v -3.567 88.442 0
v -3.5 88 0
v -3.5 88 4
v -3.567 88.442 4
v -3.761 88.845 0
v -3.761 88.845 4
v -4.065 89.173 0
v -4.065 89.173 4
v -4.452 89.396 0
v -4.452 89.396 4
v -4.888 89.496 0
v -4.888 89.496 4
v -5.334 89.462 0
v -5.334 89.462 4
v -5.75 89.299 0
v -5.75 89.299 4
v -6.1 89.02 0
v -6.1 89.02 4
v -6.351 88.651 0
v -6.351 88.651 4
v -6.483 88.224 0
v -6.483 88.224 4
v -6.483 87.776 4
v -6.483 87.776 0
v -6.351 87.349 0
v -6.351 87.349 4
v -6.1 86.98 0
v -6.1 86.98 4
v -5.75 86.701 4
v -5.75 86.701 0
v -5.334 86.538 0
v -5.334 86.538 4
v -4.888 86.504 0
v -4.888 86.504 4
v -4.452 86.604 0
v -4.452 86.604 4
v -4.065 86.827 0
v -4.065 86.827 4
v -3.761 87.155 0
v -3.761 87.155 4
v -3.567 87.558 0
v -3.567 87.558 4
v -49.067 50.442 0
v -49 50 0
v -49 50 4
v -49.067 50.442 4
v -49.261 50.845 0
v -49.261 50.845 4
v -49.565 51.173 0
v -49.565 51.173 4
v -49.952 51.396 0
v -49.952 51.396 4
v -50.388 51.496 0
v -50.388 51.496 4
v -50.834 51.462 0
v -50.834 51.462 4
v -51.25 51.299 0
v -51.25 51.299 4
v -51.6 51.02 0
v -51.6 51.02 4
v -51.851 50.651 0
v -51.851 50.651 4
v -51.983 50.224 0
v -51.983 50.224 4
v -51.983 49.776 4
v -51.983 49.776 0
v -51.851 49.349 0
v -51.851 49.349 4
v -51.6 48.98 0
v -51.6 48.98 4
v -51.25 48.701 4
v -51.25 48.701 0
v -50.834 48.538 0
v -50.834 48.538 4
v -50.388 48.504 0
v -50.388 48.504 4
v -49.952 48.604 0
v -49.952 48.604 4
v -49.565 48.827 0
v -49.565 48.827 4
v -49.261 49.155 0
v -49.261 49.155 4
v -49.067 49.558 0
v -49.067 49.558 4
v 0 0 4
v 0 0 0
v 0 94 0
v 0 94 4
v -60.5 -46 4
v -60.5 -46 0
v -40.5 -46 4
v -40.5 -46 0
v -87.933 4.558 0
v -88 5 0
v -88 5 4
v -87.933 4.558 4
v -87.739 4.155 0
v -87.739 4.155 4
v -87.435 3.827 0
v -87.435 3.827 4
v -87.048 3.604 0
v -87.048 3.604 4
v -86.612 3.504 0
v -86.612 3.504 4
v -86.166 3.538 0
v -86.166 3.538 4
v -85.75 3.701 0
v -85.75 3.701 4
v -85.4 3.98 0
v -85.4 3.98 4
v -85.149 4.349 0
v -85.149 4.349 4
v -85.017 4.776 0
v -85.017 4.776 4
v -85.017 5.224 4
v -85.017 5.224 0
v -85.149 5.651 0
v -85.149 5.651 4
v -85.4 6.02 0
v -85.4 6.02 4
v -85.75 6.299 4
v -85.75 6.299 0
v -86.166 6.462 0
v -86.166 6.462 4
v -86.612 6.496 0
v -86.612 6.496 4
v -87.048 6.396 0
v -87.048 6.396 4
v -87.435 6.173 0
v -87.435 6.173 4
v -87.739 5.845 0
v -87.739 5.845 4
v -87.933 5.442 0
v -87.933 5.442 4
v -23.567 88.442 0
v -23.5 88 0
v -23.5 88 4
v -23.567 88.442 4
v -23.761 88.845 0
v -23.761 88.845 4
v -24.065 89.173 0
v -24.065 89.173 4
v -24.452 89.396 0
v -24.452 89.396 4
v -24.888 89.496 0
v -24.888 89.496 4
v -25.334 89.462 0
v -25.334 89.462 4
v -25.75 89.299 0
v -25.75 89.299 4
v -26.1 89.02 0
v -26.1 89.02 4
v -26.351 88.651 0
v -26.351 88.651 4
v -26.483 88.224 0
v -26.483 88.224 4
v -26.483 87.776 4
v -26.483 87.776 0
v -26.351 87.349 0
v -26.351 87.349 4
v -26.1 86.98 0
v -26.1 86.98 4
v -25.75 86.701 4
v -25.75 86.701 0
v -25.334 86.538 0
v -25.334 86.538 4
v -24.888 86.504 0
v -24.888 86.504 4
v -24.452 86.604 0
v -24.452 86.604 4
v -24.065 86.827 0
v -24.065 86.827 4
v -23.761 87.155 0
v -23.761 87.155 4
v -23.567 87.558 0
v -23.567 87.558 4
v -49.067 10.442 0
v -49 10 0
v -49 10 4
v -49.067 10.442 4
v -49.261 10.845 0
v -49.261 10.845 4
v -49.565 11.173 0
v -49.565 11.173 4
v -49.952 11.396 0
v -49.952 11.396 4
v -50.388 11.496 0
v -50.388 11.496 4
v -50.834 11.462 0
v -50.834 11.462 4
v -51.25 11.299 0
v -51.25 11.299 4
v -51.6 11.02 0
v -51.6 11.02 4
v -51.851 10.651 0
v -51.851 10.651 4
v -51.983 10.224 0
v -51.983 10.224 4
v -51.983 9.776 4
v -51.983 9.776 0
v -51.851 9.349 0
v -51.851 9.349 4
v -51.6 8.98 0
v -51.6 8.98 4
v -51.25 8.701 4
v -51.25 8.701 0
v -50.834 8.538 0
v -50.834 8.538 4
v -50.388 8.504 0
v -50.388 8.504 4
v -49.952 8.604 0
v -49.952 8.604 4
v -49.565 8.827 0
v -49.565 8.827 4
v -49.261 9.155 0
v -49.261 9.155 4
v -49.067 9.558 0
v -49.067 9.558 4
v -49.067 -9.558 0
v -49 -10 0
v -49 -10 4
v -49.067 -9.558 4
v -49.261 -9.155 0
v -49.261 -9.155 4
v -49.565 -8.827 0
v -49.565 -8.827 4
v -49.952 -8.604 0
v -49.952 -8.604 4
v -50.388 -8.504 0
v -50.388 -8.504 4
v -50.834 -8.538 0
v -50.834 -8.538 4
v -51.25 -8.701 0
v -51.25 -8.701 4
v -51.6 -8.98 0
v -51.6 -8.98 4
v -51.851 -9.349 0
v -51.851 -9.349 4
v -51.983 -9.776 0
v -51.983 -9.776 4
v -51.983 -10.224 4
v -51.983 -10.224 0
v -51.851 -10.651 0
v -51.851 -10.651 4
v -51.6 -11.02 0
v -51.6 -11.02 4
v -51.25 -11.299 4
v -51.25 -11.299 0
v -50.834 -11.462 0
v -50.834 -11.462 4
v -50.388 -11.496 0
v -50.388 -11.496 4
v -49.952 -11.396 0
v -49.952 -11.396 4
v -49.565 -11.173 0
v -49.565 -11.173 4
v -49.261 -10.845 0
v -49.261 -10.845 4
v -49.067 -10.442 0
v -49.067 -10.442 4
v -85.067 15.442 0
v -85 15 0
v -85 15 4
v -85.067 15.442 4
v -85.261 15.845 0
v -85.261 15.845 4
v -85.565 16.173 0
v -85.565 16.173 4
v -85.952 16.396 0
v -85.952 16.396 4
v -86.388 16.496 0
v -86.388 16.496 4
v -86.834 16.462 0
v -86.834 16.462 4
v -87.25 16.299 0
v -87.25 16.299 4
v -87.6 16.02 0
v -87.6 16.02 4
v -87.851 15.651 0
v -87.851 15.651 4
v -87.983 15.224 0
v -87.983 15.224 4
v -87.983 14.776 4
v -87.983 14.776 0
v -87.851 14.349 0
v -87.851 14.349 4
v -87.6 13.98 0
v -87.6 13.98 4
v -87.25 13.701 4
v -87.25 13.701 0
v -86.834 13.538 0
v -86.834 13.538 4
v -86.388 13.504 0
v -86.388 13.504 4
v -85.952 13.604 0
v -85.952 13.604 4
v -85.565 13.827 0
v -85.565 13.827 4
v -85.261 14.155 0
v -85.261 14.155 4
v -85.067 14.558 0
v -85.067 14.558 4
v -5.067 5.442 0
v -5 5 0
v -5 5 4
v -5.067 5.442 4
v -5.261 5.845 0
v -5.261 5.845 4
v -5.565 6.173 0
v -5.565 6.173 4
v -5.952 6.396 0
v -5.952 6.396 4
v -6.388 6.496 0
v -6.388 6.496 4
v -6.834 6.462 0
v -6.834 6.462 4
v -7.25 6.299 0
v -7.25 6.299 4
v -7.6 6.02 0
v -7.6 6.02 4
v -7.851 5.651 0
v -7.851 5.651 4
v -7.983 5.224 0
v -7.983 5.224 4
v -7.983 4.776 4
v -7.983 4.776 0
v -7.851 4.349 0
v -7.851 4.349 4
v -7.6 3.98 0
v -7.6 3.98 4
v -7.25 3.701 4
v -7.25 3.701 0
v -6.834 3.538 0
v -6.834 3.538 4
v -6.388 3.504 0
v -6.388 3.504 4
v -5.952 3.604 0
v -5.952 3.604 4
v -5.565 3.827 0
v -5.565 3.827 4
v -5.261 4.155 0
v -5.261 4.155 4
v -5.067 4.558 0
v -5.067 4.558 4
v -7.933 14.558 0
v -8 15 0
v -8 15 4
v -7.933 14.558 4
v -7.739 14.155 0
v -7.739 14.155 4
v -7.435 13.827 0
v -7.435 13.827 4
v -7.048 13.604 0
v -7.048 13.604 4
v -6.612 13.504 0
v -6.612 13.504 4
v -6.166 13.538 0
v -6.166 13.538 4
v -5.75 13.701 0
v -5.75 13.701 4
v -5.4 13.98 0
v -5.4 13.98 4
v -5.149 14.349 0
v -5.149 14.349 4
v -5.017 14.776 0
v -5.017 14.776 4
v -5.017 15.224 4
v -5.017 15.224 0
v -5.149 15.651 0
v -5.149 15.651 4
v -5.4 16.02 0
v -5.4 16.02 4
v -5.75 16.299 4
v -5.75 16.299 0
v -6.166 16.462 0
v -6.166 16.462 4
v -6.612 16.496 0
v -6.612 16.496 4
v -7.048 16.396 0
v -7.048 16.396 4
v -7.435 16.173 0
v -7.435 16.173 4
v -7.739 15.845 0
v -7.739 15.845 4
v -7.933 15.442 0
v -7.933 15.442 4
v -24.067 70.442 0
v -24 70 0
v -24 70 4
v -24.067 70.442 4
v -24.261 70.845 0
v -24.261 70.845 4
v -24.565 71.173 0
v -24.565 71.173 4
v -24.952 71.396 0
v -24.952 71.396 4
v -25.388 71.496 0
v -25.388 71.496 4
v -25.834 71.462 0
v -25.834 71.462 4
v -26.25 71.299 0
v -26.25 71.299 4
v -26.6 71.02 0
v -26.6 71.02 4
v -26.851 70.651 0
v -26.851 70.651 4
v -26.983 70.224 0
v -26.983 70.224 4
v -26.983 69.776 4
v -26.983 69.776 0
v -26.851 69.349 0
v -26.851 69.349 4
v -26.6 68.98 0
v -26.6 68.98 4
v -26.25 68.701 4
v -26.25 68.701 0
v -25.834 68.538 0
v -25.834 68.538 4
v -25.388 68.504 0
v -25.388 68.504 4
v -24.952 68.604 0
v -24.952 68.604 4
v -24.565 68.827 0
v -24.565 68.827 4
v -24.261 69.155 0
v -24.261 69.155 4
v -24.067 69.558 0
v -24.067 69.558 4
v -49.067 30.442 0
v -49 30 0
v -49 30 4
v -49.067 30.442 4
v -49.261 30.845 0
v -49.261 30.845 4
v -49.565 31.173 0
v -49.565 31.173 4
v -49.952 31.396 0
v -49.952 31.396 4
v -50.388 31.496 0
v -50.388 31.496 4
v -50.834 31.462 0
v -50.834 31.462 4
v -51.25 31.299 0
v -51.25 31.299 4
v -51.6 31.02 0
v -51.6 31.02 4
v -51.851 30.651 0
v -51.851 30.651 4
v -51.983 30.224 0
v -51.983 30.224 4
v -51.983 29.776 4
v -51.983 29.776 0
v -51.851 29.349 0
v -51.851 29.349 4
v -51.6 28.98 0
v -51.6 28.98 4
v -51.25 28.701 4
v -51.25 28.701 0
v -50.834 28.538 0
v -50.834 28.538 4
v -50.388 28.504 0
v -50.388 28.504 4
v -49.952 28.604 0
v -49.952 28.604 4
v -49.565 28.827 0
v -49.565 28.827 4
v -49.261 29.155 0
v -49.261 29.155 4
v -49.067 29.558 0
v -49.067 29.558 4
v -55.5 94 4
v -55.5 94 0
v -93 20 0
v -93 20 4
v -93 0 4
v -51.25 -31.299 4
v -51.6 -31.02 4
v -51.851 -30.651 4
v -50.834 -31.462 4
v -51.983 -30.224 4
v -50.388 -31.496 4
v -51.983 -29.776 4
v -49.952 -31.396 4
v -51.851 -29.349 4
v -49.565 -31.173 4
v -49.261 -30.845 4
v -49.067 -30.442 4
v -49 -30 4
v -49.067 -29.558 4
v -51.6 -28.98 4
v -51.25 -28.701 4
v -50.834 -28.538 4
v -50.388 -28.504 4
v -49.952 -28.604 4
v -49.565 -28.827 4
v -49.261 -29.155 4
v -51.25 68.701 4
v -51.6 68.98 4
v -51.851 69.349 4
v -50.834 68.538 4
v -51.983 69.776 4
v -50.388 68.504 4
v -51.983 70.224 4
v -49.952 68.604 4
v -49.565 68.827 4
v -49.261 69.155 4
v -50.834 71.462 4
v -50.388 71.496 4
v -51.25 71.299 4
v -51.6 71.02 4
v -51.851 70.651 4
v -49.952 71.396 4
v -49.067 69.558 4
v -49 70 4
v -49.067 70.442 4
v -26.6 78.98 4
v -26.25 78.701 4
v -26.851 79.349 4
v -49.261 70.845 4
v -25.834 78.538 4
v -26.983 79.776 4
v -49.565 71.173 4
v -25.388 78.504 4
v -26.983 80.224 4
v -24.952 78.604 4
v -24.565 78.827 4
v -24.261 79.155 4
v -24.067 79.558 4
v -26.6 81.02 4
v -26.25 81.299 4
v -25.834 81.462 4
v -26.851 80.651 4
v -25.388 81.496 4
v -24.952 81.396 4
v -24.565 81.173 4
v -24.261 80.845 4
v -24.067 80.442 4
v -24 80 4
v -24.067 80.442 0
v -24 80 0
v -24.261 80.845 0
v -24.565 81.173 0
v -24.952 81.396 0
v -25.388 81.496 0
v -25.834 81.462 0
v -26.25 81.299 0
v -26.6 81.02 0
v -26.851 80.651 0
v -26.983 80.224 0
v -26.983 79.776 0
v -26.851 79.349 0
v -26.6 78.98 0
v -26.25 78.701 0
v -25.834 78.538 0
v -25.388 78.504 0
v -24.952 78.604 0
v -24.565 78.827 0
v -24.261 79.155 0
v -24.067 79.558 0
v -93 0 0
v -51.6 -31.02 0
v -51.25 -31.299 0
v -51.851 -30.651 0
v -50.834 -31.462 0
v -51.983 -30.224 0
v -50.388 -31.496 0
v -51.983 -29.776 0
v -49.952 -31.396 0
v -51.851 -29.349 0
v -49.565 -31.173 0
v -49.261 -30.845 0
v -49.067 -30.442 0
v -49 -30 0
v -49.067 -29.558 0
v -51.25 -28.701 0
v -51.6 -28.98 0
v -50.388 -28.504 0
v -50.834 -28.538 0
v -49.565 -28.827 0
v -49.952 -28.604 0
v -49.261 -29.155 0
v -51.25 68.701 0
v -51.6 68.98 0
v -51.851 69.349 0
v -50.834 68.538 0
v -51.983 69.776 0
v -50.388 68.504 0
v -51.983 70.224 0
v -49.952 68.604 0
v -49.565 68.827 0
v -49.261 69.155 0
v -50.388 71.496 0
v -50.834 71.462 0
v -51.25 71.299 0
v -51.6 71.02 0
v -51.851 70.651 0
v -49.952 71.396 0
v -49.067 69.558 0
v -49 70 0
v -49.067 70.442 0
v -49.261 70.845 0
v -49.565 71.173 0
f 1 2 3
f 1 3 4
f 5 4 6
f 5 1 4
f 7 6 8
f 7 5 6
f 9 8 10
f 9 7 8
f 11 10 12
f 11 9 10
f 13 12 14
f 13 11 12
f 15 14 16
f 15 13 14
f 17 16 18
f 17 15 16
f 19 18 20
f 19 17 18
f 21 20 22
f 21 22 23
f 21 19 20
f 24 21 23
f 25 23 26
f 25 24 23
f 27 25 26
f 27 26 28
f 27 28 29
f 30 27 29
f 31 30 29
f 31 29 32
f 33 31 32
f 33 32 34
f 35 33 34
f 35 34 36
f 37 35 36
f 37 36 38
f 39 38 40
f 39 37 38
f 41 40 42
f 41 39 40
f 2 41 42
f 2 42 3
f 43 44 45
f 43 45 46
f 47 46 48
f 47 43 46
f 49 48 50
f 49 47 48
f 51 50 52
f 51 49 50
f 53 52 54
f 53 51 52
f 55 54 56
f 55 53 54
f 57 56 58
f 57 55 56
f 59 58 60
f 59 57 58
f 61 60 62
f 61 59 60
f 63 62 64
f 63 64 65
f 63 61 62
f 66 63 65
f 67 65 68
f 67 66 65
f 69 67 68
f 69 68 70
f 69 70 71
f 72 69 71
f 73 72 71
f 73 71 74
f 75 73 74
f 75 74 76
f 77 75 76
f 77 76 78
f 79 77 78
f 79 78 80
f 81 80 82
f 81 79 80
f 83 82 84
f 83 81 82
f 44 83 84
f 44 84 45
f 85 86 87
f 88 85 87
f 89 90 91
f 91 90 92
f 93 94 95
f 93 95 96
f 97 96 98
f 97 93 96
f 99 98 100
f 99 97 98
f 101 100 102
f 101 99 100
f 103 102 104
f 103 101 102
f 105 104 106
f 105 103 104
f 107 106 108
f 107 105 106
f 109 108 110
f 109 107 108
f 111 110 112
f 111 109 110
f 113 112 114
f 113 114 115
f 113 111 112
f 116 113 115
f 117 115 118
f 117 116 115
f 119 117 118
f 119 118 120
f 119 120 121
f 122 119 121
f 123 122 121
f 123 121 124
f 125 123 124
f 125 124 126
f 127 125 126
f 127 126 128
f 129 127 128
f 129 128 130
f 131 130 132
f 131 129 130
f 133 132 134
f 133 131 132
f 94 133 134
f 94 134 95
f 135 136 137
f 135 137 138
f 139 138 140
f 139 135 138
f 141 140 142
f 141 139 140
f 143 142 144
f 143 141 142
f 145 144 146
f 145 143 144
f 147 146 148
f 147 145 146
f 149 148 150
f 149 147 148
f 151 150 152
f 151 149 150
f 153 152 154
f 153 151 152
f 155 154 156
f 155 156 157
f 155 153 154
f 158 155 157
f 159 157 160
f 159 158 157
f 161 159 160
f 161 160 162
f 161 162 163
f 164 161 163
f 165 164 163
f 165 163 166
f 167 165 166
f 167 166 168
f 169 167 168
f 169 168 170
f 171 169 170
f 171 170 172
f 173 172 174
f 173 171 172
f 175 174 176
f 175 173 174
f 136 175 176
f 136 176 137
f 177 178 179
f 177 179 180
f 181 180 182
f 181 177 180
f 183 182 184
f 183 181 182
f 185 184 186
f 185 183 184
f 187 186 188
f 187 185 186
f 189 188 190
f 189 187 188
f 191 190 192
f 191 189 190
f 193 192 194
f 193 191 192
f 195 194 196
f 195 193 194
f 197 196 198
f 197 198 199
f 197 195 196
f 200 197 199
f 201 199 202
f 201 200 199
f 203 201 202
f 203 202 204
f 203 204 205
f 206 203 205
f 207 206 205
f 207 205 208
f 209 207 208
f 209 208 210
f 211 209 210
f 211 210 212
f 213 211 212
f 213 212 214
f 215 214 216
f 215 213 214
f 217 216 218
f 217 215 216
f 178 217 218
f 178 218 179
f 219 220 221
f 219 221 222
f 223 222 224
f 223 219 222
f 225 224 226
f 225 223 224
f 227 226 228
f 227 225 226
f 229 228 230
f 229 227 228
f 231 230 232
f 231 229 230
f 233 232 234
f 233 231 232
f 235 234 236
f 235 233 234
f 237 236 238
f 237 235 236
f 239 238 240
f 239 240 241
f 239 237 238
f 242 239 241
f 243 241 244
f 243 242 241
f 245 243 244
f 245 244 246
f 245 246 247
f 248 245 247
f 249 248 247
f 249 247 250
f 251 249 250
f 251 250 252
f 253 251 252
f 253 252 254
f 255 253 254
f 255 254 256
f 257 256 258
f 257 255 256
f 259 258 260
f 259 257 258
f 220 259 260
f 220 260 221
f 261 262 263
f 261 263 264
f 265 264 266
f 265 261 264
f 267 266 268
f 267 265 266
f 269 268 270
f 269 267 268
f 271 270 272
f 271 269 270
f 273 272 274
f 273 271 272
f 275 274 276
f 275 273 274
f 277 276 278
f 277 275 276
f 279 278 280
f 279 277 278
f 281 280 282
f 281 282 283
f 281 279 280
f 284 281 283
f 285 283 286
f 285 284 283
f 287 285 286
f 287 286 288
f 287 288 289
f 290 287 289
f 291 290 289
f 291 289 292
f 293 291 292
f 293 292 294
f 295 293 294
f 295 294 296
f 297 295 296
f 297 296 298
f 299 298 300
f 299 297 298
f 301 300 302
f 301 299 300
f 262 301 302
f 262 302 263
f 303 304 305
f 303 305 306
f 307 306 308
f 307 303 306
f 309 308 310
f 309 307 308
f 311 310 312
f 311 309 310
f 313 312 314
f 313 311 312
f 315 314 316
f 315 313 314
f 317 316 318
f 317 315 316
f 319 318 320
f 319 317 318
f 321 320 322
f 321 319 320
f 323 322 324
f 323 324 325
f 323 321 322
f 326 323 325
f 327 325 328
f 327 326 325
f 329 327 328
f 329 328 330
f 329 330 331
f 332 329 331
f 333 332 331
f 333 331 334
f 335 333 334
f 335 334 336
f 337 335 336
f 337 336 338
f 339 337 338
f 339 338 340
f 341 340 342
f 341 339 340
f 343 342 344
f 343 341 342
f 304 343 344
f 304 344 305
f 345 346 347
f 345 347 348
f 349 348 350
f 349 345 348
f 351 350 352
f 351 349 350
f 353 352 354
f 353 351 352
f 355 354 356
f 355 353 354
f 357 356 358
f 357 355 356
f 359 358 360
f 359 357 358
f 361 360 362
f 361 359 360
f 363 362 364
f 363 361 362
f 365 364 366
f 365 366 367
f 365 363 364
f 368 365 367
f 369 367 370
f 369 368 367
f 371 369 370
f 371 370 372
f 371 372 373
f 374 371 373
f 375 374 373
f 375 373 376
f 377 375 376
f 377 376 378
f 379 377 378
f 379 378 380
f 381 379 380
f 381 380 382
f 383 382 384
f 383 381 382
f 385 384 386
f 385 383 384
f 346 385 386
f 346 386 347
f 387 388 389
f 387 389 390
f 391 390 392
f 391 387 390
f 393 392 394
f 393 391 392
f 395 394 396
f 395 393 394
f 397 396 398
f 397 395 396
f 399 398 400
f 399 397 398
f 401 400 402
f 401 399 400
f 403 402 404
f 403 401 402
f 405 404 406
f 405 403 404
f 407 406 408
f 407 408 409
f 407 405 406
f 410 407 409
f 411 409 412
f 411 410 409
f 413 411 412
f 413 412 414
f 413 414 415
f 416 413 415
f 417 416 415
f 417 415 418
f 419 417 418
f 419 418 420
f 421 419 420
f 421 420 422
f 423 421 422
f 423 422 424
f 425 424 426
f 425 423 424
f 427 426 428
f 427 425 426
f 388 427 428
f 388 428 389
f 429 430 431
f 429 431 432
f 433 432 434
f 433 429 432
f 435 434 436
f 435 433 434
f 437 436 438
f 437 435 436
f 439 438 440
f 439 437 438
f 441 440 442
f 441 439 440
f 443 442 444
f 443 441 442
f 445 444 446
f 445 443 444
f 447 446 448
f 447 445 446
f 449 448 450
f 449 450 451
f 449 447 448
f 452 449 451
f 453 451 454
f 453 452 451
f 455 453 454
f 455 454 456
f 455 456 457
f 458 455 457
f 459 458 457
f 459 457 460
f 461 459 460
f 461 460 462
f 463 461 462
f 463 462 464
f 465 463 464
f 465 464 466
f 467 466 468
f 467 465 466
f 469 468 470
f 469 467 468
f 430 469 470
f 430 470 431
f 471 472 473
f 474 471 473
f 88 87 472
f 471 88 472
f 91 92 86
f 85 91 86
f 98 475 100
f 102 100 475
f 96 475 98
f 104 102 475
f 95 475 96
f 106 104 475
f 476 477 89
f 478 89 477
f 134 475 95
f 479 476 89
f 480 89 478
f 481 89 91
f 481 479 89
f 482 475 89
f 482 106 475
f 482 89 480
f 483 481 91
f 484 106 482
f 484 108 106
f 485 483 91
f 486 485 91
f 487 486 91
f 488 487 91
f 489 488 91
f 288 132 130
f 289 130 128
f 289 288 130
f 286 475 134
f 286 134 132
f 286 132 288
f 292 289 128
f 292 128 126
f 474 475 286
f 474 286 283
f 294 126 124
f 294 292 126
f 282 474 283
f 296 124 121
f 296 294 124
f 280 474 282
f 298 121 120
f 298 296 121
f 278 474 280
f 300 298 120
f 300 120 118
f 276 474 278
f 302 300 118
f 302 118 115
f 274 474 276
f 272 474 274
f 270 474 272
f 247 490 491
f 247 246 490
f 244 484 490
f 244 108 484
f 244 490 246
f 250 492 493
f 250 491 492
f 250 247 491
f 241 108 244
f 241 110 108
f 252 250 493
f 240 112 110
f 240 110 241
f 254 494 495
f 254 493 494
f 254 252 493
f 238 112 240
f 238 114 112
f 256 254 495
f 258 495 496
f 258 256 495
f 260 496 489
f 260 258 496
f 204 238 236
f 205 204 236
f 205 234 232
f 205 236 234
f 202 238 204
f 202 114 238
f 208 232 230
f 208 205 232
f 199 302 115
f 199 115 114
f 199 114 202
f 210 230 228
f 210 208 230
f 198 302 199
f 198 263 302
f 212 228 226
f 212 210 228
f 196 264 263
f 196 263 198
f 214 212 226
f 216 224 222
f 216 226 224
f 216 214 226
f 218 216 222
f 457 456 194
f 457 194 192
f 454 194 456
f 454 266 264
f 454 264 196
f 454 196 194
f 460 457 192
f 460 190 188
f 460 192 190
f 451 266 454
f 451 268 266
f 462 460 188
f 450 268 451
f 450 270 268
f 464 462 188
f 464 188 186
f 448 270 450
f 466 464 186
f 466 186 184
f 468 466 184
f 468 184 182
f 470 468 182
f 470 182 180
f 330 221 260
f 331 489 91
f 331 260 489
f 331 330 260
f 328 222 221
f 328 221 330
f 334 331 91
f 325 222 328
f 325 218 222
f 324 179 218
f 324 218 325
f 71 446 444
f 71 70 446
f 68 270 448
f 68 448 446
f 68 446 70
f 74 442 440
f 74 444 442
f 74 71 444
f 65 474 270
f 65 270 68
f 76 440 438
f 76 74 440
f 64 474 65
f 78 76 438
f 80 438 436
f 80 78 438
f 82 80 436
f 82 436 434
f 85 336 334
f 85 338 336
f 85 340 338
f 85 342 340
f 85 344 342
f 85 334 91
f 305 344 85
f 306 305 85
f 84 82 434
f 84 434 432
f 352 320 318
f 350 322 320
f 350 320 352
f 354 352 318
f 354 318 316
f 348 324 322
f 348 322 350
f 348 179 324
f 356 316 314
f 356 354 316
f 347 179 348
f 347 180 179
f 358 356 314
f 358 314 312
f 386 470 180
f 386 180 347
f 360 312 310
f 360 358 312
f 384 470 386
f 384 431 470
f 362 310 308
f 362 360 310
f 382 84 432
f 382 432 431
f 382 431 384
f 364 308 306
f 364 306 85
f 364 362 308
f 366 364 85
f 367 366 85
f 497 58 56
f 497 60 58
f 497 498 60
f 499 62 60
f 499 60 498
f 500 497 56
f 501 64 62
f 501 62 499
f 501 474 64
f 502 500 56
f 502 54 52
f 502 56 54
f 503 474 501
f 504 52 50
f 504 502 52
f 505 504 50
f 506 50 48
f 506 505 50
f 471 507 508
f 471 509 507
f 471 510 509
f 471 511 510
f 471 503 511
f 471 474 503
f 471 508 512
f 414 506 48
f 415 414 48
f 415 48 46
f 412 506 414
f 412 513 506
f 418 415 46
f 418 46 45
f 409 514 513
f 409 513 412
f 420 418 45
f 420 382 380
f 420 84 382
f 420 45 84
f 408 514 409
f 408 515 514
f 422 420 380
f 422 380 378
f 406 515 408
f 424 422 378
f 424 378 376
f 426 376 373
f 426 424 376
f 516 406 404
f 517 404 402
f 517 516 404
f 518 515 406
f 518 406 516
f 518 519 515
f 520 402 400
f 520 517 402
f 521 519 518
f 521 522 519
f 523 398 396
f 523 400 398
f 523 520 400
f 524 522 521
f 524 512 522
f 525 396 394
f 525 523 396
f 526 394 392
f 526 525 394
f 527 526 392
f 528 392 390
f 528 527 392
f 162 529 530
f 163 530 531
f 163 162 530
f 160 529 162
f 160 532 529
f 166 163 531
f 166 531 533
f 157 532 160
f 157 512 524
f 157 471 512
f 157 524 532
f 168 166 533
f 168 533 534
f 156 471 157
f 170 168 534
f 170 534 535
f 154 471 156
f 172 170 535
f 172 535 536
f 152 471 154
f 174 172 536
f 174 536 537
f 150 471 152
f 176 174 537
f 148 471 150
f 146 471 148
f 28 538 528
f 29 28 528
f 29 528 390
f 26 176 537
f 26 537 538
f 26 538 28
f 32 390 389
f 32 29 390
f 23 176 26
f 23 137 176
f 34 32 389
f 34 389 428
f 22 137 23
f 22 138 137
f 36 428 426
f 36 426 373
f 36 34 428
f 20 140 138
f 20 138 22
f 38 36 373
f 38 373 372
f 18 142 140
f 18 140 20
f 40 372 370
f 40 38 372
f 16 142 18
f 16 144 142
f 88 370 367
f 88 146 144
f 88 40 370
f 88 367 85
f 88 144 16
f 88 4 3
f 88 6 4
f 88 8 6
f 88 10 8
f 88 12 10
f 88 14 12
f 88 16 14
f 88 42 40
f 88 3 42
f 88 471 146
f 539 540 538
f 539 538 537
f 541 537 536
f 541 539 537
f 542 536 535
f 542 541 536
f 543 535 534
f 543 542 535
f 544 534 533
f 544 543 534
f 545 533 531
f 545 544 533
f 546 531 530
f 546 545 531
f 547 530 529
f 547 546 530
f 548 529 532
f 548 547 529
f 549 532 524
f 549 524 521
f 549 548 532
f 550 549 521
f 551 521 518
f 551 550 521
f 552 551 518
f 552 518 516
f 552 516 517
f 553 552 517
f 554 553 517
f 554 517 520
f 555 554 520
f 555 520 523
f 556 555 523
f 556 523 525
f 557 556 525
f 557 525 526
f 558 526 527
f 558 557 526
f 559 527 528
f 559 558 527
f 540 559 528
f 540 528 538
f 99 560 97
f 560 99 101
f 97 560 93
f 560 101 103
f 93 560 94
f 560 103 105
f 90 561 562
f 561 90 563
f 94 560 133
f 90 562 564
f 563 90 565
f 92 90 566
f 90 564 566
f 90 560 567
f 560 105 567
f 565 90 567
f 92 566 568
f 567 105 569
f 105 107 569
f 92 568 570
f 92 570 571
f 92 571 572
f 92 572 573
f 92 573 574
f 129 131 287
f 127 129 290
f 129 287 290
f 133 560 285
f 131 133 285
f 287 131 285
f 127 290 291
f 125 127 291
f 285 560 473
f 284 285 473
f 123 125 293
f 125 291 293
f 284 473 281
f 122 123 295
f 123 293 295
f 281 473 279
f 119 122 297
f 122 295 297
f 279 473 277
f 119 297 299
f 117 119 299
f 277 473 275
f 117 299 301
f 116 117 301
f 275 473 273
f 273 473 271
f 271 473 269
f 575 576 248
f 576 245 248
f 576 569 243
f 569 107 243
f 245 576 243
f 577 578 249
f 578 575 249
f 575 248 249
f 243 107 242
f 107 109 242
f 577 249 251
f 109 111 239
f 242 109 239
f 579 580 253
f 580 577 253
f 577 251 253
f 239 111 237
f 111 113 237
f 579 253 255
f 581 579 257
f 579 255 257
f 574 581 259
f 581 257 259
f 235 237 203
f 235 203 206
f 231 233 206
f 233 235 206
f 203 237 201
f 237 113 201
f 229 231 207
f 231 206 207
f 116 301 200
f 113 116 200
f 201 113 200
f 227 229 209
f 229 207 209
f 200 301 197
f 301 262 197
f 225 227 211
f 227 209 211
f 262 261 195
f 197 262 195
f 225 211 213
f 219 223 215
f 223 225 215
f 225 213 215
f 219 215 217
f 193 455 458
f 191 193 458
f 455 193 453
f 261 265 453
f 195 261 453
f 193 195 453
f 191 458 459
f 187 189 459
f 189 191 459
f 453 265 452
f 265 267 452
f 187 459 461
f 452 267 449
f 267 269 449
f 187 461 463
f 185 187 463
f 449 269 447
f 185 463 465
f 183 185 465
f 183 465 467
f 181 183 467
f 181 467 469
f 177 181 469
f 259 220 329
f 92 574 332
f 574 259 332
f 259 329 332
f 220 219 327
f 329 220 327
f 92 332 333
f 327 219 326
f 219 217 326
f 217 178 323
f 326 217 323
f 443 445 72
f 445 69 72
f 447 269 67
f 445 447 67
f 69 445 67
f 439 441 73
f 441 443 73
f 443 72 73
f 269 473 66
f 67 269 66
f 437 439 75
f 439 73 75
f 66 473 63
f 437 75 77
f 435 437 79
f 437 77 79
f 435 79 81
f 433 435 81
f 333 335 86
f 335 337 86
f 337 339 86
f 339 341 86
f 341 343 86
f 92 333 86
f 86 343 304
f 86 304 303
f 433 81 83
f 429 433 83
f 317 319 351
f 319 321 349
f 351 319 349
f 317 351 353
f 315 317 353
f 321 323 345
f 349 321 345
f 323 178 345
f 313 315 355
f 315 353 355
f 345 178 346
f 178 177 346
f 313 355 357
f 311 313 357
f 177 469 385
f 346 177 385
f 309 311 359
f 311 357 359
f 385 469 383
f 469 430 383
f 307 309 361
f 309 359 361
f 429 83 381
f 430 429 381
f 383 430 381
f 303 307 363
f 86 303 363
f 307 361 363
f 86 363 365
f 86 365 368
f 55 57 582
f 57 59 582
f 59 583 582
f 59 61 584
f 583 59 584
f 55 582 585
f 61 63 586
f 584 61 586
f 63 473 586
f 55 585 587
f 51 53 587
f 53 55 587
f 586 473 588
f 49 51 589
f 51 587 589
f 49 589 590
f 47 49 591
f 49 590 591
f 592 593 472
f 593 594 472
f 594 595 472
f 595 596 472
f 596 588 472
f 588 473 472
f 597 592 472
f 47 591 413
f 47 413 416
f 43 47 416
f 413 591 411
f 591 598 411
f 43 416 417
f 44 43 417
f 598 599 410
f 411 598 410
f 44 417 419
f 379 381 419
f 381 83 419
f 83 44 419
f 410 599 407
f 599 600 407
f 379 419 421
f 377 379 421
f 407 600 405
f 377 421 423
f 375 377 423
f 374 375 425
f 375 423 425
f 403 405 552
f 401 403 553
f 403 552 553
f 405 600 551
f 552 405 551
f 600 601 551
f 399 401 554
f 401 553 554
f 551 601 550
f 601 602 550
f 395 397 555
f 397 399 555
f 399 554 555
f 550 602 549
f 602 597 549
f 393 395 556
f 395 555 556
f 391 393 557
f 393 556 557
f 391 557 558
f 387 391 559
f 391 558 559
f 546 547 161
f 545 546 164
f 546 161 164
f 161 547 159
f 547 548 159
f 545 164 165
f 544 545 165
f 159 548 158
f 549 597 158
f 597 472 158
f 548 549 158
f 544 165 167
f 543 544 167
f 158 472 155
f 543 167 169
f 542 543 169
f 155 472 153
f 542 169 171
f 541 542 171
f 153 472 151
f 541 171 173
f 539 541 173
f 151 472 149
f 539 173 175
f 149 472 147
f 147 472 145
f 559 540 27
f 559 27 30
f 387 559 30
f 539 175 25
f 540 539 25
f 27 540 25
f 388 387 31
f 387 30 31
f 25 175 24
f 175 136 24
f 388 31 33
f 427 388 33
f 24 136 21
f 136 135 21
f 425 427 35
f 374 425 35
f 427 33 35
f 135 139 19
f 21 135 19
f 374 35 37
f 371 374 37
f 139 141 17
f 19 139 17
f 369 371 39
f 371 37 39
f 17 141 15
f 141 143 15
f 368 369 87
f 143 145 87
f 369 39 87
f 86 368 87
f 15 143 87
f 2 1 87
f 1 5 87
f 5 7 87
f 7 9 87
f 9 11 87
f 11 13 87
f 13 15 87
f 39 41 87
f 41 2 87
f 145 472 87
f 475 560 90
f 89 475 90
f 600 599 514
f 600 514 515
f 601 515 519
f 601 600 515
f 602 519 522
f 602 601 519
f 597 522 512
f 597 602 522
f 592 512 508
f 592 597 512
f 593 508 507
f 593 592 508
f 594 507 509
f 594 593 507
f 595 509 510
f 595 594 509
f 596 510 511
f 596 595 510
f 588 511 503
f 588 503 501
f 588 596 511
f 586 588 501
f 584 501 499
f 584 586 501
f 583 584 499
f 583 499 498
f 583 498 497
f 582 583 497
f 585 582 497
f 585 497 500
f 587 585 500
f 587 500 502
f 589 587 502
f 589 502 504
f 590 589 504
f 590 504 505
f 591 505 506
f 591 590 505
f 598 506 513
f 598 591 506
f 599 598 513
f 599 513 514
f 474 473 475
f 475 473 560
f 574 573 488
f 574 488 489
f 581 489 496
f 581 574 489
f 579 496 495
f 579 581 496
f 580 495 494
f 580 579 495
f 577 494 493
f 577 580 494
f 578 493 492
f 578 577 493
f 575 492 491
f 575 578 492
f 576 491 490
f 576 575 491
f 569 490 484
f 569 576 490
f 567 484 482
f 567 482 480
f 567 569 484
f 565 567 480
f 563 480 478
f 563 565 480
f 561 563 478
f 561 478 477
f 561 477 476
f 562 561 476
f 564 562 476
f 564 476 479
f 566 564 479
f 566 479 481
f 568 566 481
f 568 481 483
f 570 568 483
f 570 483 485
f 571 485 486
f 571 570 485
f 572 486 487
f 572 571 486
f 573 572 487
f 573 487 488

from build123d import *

# Parameters (mm, degrees)
SKETCH_1_R      = 1.5
EXTRUDE_1_DEPTH = 4


with BuildPart() as part:
    # 草图1 → 凸台-拉伸1 (new body)
    with BuildSketch(Plane.XY):
        Polygon((0, 0), (0, 94), (-55.5, 94), (-93, 20), (-93, 0), (-60.5, -46), (-40.5, -46), align=None)
        with Locations((-86.5, 15)):
            Circle(SKETCH_1_R, mode=Mode.SUBTRACT)
        with Locations(Location((-86.5, 5, 0), (0, 0, 180))):
            Circle(SKETCH_1_R, mode=Mode.SUBTRACT)
        with Locations((-6.5, 5)):
            Circle(SKETCH_1_R, mode=Mode.SUBTRACT)
        with Locations(Location((-6.5, 15, 0), (0, 0, 180))):
            Circle(SKETCH_1_R, mode=Mode.SUBTRACT)
        with Locations((-25.5, 80)):
            Circle(SKETCH_1_R, mode=Mode.SUBTRACT)
        with Locations((-25.5, 70)):
            Circle(SKETCH_1_R, mode=Mode.SUBTRACT)
        with Locations((-50.5, 10)):
            Circle(SKETCH_1_R, mode=Mode.SUBTRACT)
        with Locations((-50.5, 30)):
            Circle(SKETCH_1_R, mode=Mode.SUBTRACT)
        with Locations((-50.5, 50)):
            Circle(SKETCH_1_R, mode=Mode.SUBTRACT)
        with Locations((-50.5, -10)):
            Circle(SKETCH_1_R, mode=Mode.SUBTRACT)
        with Locations((-50.5, -30)):
            Circle(SKETCH_1_R, mode=Mode.SUBTRACT)
        with Locations((-5, 88)):
            Circle(SKETCH_1_R, mode=Mode.SUBTRACT)
        with Locations((-25, 88)):
            Circle(SKETCH_1_R, mode=Mode.SUBTRACT)
        with Locations((-50.5, 70)):
            Circle(SKETCH_1_R, mode=Mode.SUBTRACT)
    extrude(amount=EXTRUDE_1_DEPTH)


solid = part.part
